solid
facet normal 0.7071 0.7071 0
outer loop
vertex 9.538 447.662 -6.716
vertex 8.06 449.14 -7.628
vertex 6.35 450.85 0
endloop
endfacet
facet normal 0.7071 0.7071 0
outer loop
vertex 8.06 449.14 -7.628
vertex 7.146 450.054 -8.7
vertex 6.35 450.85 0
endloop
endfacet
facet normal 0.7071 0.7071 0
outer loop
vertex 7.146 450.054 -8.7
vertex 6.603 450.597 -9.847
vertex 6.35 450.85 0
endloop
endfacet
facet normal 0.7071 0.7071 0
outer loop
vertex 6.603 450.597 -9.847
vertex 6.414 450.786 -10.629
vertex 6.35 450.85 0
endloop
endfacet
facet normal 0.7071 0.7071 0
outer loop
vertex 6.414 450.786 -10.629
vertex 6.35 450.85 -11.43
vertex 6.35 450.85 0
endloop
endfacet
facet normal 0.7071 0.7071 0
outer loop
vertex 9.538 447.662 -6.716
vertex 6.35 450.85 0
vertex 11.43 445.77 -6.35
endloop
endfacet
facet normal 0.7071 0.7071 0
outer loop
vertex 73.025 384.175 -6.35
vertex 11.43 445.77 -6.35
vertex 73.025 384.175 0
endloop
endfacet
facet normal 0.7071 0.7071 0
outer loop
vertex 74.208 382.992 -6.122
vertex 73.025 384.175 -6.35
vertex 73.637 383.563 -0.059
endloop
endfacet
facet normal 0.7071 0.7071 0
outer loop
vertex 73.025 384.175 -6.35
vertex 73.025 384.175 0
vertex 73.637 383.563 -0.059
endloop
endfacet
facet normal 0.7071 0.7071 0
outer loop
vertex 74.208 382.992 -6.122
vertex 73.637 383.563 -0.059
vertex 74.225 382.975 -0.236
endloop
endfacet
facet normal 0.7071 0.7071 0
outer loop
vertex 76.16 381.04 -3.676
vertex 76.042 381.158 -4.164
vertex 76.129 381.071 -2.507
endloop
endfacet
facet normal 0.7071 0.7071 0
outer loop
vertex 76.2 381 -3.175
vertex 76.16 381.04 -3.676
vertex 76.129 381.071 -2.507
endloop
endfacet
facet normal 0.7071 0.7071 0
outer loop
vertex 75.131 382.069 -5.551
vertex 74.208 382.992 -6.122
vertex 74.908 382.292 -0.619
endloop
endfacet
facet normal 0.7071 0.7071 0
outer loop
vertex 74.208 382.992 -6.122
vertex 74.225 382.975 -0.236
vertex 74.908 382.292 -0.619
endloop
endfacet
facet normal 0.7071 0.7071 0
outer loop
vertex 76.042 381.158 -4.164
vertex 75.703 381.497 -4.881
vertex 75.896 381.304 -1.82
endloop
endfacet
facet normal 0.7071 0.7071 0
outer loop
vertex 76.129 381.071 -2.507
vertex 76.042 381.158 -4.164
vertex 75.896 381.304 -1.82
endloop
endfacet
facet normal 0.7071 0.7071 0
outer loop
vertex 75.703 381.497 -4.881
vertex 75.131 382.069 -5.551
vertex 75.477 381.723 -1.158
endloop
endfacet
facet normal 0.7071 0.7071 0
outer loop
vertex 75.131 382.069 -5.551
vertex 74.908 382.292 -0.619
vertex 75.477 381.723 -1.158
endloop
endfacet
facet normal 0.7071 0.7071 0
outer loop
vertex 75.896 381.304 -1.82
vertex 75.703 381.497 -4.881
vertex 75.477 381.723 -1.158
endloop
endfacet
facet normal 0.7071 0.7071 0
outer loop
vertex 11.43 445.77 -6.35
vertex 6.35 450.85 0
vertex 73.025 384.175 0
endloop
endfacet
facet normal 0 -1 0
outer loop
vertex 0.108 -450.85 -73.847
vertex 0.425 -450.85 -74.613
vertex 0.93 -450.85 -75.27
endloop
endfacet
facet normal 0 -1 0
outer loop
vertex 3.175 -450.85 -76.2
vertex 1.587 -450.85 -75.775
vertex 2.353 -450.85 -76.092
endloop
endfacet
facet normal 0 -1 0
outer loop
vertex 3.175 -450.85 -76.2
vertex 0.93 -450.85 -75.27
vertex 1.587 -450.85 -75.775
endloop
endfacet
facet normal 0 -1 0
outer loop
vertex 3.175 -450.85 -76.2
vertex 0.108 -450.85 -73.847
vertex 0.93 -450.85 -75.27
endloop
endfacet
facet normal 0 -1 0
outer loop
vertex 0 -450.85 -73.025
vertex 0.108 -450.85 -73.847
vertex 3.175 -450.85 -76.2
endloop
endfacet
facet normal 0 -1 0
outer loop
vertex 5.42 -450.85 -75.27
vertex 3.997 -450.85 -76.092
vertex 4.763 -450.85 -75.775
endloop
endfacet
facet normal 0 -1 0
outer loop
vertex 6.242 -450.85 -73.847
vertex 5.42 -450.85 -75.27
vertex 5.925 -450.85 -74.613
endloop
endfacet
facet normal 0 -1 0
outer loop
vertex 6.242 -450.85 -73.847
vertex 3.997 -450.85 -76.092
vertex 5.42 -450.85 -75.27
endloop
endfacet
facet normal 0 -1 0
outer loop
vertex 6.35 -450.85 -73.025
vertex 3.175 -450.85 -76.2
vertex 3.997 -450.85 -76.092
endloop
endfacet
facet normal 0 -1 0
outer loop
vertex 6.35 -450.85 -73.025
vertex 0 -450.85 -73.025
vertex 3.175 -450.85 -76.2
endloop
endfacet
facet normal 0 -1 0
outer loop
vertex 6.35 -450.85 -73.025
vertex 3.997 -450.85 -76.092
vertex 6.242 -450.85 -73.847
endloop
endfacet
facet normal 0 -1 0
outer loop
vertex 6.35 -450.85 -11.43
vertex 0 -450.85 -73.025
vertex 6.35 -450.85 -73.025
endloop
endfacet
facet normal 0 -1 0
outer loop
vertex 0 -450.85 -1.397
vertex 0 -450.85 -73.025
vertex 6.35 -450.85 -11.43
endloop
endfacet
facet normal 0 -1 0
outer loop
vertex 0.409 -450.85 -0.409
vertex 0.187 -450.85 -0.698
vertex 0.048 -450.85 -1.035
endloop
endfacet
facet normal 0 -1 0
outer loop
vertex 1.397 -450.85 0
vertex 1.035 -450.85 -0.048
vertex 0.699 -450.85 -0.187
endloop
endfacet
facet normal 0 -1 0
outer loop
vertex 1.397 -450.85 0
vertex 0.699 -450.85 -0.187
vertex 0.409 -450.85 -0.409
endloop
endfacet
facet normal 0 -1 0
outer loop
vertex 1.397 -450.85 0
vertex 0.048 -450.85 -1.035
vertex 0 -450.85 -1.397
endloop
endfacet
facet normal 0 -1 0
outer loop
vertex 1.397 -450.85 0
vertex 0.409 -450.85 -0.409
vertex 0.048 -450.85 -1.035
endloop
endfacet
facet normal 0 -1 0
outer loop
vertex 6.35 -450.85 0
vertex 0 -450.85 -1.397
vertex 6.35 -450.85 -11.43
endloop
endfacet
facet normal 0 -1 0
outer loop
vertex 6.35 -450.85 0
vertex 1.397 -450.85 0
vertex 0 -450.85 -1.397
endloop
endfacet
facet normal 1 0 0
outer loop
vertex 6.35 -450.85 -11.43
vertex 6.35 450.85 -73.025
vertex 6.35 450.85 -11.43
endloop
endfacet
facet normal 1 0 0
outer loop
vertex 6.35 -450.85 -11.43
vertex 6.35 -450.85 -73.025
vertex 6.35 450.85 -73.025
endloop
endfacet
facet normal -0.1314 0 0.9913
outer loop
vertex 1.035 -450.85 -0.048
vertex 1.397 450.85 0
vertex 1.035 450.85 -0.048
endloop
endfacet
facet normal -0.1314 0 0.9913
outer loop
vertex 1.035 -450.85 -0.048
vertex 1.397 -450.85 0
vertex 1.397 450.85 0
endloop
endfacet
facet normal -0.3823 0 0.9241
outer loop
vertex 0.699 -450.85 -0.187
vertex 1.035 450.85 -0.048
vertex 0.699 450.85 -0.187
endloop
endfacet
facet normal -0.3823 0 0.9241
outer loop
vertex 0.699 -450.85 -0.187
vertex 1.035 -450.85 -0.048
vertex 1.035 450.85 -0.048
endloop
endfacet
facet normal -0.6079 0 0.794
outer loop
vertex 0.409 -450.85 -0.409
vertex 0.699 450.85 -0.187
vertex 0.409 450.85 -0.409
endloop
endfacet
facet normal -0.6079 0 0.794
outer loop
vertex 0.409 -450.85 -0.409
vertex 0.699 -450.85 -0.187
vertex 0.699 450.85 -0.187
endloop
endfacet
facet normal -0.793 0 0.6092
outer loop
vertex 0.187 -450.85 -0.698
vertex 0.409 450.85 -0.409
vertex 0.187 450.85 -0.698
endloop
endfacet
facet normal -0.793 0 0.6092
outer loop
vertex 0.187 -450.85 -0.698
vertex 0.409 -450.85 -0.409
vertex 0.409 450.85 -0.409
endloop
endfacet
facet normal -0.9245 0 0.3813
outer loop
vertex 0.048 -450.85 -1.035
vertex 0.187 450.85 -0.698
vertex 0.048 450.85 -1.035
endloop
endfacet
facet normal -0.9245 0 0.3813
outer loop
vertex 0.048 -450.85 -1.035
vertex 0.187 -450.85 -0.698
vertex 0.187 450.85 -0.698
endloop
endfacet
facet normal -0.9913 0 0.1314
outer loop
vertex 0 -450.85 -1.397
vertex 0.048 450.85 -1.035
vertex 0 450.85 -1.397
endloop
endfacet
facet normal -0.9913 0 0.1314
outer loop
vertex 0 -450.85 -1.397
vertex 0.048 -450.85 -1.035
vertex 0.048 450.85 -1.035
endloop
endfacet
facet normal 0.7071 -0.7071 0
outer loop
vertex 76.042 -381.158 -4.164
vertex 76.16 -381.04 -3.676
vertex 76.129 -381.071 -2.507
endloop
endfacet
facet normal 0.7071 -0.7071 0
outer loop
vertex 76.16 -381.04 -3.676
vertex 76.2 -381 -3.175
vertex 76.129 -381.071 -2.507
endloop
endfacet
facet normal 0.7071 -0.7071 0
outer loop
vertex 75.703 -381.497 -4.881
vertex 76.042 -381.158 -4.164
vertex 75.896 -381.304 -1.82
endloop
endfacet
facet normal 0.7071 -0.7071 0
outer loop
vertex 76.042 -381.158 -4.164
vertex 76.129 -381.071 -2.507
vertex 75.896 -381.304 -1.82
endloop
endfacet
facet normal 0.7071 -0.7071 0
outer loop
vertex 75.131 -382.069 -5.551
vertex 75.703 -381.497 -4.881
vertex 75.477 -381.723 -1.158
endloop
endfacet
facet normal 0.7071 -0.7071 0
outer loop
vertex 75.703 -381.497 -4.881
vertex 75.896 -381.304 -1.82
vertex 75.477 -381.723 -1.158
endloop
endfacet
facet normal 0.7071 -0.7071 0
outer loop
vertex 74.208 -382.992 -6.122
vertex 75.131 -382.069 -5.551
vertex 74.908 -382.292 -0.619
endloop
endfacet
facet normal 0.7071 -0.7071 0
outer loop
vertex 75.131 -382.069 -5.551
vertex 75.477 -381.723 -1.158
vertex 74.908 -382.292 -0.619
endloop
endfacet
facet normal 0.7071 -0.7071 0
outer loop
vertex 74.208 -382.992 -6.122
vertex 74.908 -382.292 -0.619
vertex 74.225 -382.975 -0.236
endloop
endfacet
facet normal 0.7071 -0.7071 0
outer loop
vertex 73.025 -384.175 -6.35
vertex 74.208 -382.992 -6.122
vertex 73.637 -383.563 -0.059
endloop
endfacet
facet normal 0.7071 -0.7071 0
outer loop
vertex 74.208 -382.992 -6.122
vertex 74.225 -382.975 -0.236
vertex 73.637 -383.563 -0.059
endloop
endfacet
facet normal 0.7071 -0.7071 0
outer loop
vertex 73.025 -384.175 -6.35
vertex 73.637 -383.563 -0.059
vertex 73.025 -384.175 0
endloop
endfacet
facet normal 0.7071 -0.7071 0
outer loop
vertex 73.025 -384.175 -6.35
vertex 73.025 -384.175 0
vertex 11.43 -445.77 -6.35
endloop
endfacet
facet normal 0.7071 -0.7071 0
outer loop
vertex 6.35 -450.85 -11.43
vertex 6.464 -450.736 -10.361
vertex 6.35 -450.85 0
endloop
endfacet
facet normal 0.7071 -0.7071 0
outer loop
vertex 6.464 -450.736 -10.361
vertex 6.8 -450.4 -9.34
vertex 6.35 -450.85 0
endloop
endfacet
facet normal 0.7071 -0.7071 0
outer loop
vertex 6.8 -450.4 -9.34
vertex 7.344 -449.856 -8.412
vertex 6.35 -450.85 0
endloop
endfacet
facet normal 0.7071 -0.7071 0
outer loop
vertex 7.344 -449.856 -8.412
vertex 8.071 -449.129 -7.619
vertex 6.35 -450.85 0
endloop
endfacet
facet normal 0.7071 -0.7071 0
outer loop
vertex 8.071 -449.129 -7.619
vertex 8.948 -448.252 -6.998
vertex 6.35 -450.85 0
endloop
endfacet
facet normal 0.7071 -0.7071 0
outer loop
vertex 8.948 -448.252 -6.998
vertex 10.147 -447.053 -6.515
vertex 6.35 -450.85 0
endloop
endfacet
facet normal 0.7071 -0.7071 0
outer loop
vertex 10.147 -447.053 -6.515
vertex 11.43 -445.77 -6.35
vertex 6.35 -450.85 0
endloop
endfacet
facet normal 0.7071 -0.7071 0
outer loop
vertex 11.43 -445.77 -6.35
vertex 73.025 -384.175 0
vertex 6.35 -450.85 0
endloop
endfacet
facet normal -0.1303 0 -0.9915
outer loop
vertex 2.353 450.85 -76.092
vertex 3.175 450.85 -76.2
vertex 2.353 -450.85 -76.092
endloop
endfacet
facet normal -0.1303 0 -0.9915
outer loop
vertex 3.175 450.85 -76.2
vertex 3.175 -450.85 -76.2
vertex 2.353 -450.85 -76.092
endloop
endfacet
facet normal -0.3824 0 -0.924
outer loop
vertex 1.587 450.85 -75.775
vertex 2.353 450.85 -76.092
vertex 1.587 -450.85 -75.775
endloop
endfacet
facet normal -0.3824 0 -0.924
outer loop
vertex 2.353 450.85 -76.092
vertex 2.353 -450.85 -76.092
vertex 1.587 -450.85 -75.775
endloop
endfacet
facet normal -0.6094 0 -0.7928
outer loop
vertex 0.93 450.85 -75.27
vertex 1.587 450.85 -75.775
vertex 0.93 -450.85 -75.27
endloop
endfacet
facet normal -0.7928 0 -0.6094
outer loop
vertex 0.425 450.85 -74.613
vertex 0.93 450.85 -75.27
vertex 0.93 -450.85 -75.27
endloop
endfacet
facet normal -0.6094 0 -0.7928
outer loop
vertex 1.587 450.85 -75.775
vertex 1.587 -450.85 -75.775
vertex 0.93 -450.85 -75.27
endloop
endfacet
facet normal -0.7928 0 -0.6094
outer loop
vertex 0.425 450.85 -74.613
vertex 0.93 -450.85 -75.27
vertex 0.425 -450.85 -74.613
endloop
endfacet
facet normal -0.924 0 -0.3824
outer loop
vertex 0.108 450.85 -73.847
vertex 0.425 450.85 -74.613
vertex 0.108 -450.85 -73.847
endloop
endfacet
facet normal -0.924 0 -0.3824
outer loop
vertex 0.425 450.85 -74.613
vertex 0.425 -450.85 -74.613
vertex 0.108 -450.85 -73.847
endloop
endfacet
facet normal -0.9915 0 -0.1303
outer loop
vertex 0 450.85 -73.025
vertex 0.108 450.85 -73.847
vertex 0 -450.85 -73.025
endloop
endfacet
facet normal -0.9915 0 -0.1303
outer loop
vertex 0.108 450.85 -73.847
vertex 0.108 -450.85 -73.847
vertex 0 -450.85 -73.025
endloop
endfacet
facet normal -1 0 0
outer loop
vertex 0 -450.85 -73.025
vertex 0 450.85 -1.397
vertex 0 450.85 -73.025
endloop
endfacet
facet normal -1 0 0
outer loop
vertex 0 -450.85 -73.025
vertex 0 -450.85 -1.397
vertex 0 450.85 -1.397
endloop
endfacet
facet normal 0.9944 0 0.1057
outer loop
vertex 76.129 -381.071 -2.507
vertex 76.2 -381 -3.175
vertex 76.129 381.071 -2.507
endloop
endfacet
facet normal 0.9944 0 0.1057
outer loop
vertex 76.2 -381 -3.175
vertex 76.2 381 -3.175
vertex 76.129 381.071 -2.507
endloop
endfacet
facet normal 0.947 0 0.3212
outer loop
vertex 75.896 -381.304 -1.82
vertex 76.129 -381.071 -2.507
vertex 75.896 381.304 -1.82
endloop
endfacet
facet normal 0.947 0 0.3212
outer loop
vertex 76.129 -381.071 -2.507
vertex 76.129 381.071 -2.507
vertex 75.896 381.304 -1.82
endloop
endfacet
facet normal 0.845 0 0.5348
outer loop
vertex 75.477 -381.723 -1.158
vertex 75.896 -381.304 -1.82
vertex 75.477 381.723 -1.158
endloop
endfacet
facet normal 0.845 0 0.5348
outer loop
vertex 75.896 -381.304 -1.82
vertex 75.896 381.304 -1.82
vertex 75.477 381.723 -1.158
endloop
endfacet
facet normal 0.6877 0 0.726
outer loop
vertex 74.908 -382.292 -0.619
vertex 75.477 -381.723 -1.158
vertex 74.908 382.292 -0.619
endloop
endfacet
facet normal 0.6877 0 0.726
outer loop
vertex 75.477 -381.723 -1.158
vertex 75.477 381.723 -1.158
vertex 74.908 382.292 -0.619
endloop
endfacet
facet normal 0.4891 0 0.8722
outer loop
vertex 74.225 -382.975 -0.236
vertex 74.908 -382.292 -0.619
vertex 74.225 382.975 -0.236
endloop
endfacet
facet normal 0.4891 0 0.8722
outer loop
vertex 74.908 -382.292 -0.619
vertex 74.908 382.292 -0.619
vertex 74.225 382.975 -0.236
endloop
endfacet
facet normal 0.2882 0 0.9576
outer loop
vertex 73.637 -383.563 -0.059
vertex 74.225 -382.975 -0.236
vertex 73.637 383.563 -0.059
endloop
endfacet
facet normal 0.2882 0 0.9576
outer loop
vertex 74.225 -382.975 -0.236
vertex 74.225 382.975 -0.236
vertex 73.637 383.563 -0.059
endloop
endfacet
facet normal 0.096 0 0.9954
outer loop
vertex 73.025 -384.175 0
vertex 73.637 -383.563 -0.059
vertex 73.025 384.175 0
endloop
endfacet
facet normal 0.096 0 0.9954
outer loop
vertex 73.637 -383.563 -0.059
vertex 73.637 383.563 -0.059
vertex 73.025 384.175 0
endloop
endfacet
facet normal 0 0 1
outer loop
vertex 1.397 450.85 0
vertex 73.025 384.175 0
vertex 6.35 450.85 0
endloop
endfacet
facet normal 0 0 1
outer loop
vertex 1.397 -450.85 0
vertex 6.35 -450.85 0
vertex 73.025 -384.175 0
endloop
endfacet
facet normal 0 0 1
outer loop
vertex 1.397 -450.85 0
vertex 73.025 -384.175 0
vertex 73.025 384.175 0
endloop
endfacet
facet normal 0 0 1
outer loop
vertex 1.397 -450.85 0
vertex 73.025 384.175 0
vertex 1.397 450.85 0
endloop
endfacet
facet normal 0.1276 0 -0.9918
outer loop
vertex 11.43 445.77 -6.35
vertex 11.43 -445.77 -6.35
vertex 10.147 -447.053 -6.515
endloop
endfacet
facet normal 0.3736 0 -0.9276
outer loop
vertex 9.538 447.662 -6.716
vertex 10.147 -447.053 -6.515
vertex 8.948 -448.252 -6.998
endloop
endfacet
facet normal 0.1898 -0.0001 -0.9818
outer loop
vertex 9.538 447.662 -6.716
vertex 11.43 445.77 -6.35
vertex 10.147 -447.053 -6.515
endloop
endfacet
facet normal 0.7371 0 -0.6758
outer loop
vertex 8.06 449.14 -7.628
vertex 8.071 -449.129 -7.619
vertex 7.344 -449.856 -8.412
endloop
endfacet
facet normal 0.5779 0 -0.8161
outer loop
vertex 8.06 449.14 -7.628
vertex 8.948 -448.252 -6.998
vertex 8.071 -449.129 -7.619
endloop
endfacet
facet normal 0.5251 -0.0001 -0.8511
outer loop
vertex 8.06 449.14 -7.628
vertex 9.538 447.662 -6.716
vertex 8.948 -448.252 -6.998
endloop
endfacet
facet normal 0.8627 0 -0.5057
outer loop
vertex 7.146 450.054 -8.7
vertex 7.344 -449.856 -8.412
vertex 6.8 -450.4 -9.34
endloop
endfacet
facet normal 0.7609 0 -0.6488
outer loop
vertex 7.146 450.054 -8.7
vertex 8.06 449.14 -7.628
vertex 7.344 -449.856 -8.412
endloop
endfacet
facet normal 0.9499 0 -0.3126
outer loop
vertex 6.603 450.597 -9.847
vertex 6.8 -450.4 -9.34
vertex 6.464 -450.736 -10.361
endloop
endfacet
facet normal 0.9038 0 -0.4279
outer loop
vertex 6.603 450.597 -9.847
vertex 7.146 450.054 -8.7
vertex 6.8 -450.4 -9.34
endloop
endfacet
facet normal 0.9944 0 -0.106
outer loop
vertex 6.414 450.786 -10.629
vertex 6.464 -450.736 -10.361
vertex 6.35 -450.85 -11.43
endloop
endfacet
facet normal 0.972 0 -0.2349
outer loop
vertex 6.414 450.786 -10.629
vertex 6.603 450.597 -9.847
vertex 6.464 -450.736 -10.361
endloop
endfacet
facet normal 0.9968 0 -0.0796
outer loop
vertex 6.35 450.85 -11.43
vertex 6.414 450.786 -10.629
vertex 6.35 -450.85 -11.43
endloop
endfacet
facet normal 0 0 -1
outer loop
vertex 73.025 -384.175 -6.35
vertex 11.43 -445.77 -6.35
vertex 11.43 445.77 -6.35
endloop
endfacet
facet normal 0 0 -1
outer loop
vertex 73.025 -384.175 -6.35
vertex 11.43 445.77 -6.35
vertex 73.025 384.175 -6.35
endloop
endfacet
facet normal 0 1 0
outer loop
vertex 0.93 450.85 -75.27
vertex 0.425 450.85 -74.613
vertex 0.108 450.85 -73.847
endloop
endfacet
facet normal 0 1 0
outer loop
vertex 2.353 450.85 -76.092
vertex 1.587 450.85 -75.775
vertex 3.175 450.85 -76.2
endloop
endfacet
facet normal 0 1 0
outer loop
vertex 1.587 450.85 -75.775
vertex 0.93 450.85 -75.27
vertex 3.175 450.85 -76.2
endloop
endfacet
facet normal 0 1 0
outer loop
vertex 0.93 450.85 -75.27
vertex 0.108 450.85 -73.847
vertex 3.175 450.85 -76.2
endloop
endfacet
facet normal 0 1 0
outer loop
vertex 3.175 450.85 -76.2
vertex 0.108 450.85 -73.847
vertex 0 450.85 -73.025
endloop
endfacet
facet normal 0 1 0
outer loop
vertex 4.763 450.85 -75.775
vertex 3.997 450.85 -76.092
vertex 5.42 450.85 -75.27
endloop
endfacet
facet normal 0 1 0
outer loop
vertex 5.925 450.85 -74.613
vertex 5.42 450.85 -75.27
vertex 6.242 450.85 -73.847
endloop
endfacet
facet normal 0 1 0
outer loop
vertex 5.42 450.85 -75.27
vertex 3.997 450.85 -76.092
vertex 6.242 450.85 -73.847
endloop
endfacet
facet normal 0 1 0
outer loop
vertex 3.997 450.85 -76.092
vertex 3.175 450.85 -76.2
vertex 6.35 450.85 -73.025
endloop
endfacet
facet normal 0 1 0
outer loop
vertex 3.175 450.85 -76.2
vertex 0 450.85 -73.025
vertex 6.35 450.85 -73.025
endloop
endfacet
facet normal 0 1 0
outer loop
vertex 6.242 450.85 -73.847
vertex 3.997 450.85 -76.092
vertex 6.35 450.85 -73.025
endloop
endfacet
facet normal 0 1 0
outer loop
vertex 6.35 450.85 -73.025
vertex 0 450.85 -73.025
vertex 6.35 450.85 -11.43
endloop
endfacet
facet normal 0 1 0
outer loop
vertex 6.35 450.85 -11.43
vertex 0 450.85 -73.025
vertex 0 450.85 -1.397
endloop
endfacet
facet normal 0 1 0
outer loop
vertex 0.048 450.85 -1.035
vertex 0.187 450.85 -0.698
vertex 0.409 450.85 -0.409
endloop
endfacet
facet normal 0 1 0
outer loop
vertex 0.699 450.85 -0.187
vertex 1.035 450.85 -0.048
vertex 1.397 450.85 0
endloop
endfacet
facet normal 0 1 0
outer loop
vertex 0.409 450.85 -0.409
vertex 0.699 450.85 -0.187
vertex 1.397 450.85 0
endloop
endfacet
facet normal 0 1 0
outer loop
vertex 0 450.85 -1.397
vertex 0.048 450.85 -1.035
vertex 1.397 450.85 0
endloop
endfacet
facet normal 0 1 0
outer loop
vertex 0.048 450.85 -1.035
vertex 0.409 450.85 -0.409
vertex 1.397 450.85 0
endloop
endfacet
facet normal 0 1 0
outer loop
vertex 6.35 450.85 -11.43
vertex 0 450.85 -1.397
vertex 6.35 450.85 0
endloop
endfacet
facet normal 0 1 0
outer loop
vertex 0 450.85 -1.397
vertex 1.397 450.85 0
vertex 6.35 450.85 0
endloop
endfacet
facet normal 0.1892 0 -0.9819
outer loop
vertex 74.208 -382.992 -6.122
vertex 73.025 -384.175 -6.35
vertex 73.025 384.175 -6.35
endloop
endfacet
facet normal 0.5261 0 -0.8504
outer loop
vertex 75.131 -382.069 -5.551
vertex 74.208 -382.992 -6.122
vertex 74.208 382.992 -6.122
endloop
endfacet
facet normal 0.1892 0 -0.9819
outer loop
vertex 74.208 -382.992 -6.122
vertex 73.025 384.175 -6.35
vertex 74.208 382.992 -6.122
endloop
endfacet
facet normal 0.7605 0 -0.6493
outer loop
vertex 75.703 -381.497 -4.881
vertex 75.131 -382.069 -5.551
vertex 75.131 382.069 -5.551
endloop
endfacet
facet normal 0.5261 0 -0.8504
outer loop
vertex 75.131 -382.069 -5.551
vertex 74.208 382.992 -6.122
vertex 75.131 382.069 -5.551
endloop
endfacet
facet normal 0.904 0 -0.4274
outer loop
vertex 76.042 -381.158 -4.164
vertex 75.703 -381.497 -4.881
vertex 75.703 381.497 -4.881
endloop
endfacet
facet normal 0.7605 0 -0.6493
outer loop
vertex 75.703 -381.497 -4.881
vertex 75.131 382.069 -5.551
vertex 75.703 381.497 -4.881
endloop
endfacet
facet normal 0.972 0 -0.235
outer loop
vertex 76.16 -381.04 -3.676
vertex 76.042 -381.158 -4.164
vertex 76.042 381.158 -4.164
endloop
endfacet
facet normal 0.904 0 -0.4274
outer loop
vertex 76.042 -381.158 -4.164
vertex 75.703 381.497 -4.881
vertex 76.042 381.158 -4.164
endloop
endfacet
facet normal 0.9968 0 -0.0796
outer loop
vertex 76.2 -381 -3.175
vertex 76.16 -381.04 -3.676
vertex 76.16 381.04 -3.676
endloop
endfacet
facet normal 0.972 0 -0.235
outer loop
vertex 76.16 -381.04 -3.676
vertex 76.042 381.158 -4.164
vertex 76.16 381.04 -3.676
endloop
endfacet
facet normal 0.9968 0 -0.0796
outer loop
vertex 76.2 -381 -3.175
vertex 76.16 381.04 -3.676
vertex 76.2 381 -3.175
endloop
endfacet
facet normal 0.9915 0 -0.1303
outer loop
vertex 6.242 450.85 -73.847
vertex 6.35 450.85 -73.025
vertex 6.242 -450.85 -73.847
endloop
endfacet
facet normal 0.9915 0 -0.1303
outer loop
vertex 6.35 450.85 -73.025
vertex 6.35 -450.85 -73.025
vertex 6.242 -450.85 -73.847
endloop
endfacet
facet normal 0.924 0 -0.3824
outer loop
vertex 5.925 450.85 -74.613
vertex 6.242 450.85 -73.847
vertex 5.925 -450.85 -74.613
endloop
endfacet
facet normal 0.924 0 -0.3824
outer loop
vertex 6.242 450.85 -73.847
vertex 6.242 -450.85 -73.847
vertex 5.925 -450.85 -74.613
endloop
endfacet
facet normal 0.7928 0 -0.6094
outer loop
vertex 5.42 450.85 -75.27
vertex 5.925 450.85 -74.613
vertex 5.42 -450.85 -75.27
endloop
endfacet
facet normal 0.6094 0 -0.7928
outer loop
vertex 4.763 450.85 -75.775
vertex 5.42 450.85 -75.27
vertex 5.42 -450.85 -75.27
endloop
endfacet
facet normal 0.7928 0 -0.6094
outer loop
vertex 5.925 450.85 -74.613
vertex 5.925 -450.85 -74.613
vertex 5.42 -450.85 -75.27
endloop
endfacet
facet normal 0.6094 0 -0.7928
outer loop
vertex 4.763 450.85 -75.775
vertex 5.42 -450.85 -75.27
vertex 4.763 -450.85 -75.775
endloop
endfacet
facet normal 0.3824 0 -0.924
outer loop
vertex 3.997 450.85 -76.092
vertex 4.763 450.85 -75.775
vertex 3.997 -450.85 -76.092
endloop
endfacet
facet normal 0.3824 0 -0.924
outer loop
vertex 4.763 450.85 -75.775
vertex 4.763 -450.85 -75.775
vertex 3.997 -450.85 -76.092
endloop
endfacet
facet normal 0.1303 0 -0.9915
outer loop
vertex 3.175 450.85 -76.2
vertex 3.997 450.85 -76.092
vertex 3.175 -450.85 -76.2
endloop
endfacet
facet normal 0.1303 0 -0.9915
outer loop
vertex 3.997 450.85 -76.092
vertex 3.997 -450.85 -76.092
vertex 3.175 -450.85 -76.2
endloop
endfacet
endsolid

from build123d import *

# Parameters (mm, degrees)
F1_DEPTH = 450.85
F2_R     = 5.08
F4_DEPTH = 76.201
F5_R     = 3.17499
F6_R     = 1.397


# Not quite as in the source:
# - a fillet or chamfer is up to 0.001 mm smaller than in the source, because OpenCascade refuses the exact size


with BuildPart() as f1:
    # F0 (on Front) → F1 (new body, symmetric)
    with BuildSketch(Plane.XZ):
        Polygon((76.2, 0), (0, 0), (0, -76.2), (6.35, -76.2), (6.35, -6.35), (76.2, -6.35), align=None)
    extrude(amount=F1_DEPTH, both=True)

    # F2
    f2_edges = [f1.edges().sort_by_distance(p)[0] for p in [
        (6.35, 0, -6.35),
    ]]
    fillet(f2_edges, radius=F2_R)

    # F3 (on Top) → F4 (cut, through all)
    with BuildSketch(Plane.XY):
        Polygon((76.2, 381), (76.2, 450.85), (6.35, 450.85), align=None)
        Polygon((76.2, -450.85), (76.2, -381), (6.35, -450.85), align=None)
    extrude(amount=-F4_DEPTH, mode=Mode.SUBTRACT)

    # F5 (radius 3.175 in the source; OpenCascade refuses exactly that, so slightly less here)
    f5_edges = [f1.edges().sort_by_distance(p)[0] for p in [
        (76.2, 0, -6.35),
        (76.2, 0, 0),
        (0, 0, -76.2),
        (6.35, 0, -76.2),
    ]]
    fillet(f5_edges, radius=F5_R)

    # F6
    f6_edges = [f1.edges().sort_by_distance(p)[0] for p in [
        (0, 0, 0),
    ]]
    fillet(f6_edges, radius=F6_R)


solid = f1.part
